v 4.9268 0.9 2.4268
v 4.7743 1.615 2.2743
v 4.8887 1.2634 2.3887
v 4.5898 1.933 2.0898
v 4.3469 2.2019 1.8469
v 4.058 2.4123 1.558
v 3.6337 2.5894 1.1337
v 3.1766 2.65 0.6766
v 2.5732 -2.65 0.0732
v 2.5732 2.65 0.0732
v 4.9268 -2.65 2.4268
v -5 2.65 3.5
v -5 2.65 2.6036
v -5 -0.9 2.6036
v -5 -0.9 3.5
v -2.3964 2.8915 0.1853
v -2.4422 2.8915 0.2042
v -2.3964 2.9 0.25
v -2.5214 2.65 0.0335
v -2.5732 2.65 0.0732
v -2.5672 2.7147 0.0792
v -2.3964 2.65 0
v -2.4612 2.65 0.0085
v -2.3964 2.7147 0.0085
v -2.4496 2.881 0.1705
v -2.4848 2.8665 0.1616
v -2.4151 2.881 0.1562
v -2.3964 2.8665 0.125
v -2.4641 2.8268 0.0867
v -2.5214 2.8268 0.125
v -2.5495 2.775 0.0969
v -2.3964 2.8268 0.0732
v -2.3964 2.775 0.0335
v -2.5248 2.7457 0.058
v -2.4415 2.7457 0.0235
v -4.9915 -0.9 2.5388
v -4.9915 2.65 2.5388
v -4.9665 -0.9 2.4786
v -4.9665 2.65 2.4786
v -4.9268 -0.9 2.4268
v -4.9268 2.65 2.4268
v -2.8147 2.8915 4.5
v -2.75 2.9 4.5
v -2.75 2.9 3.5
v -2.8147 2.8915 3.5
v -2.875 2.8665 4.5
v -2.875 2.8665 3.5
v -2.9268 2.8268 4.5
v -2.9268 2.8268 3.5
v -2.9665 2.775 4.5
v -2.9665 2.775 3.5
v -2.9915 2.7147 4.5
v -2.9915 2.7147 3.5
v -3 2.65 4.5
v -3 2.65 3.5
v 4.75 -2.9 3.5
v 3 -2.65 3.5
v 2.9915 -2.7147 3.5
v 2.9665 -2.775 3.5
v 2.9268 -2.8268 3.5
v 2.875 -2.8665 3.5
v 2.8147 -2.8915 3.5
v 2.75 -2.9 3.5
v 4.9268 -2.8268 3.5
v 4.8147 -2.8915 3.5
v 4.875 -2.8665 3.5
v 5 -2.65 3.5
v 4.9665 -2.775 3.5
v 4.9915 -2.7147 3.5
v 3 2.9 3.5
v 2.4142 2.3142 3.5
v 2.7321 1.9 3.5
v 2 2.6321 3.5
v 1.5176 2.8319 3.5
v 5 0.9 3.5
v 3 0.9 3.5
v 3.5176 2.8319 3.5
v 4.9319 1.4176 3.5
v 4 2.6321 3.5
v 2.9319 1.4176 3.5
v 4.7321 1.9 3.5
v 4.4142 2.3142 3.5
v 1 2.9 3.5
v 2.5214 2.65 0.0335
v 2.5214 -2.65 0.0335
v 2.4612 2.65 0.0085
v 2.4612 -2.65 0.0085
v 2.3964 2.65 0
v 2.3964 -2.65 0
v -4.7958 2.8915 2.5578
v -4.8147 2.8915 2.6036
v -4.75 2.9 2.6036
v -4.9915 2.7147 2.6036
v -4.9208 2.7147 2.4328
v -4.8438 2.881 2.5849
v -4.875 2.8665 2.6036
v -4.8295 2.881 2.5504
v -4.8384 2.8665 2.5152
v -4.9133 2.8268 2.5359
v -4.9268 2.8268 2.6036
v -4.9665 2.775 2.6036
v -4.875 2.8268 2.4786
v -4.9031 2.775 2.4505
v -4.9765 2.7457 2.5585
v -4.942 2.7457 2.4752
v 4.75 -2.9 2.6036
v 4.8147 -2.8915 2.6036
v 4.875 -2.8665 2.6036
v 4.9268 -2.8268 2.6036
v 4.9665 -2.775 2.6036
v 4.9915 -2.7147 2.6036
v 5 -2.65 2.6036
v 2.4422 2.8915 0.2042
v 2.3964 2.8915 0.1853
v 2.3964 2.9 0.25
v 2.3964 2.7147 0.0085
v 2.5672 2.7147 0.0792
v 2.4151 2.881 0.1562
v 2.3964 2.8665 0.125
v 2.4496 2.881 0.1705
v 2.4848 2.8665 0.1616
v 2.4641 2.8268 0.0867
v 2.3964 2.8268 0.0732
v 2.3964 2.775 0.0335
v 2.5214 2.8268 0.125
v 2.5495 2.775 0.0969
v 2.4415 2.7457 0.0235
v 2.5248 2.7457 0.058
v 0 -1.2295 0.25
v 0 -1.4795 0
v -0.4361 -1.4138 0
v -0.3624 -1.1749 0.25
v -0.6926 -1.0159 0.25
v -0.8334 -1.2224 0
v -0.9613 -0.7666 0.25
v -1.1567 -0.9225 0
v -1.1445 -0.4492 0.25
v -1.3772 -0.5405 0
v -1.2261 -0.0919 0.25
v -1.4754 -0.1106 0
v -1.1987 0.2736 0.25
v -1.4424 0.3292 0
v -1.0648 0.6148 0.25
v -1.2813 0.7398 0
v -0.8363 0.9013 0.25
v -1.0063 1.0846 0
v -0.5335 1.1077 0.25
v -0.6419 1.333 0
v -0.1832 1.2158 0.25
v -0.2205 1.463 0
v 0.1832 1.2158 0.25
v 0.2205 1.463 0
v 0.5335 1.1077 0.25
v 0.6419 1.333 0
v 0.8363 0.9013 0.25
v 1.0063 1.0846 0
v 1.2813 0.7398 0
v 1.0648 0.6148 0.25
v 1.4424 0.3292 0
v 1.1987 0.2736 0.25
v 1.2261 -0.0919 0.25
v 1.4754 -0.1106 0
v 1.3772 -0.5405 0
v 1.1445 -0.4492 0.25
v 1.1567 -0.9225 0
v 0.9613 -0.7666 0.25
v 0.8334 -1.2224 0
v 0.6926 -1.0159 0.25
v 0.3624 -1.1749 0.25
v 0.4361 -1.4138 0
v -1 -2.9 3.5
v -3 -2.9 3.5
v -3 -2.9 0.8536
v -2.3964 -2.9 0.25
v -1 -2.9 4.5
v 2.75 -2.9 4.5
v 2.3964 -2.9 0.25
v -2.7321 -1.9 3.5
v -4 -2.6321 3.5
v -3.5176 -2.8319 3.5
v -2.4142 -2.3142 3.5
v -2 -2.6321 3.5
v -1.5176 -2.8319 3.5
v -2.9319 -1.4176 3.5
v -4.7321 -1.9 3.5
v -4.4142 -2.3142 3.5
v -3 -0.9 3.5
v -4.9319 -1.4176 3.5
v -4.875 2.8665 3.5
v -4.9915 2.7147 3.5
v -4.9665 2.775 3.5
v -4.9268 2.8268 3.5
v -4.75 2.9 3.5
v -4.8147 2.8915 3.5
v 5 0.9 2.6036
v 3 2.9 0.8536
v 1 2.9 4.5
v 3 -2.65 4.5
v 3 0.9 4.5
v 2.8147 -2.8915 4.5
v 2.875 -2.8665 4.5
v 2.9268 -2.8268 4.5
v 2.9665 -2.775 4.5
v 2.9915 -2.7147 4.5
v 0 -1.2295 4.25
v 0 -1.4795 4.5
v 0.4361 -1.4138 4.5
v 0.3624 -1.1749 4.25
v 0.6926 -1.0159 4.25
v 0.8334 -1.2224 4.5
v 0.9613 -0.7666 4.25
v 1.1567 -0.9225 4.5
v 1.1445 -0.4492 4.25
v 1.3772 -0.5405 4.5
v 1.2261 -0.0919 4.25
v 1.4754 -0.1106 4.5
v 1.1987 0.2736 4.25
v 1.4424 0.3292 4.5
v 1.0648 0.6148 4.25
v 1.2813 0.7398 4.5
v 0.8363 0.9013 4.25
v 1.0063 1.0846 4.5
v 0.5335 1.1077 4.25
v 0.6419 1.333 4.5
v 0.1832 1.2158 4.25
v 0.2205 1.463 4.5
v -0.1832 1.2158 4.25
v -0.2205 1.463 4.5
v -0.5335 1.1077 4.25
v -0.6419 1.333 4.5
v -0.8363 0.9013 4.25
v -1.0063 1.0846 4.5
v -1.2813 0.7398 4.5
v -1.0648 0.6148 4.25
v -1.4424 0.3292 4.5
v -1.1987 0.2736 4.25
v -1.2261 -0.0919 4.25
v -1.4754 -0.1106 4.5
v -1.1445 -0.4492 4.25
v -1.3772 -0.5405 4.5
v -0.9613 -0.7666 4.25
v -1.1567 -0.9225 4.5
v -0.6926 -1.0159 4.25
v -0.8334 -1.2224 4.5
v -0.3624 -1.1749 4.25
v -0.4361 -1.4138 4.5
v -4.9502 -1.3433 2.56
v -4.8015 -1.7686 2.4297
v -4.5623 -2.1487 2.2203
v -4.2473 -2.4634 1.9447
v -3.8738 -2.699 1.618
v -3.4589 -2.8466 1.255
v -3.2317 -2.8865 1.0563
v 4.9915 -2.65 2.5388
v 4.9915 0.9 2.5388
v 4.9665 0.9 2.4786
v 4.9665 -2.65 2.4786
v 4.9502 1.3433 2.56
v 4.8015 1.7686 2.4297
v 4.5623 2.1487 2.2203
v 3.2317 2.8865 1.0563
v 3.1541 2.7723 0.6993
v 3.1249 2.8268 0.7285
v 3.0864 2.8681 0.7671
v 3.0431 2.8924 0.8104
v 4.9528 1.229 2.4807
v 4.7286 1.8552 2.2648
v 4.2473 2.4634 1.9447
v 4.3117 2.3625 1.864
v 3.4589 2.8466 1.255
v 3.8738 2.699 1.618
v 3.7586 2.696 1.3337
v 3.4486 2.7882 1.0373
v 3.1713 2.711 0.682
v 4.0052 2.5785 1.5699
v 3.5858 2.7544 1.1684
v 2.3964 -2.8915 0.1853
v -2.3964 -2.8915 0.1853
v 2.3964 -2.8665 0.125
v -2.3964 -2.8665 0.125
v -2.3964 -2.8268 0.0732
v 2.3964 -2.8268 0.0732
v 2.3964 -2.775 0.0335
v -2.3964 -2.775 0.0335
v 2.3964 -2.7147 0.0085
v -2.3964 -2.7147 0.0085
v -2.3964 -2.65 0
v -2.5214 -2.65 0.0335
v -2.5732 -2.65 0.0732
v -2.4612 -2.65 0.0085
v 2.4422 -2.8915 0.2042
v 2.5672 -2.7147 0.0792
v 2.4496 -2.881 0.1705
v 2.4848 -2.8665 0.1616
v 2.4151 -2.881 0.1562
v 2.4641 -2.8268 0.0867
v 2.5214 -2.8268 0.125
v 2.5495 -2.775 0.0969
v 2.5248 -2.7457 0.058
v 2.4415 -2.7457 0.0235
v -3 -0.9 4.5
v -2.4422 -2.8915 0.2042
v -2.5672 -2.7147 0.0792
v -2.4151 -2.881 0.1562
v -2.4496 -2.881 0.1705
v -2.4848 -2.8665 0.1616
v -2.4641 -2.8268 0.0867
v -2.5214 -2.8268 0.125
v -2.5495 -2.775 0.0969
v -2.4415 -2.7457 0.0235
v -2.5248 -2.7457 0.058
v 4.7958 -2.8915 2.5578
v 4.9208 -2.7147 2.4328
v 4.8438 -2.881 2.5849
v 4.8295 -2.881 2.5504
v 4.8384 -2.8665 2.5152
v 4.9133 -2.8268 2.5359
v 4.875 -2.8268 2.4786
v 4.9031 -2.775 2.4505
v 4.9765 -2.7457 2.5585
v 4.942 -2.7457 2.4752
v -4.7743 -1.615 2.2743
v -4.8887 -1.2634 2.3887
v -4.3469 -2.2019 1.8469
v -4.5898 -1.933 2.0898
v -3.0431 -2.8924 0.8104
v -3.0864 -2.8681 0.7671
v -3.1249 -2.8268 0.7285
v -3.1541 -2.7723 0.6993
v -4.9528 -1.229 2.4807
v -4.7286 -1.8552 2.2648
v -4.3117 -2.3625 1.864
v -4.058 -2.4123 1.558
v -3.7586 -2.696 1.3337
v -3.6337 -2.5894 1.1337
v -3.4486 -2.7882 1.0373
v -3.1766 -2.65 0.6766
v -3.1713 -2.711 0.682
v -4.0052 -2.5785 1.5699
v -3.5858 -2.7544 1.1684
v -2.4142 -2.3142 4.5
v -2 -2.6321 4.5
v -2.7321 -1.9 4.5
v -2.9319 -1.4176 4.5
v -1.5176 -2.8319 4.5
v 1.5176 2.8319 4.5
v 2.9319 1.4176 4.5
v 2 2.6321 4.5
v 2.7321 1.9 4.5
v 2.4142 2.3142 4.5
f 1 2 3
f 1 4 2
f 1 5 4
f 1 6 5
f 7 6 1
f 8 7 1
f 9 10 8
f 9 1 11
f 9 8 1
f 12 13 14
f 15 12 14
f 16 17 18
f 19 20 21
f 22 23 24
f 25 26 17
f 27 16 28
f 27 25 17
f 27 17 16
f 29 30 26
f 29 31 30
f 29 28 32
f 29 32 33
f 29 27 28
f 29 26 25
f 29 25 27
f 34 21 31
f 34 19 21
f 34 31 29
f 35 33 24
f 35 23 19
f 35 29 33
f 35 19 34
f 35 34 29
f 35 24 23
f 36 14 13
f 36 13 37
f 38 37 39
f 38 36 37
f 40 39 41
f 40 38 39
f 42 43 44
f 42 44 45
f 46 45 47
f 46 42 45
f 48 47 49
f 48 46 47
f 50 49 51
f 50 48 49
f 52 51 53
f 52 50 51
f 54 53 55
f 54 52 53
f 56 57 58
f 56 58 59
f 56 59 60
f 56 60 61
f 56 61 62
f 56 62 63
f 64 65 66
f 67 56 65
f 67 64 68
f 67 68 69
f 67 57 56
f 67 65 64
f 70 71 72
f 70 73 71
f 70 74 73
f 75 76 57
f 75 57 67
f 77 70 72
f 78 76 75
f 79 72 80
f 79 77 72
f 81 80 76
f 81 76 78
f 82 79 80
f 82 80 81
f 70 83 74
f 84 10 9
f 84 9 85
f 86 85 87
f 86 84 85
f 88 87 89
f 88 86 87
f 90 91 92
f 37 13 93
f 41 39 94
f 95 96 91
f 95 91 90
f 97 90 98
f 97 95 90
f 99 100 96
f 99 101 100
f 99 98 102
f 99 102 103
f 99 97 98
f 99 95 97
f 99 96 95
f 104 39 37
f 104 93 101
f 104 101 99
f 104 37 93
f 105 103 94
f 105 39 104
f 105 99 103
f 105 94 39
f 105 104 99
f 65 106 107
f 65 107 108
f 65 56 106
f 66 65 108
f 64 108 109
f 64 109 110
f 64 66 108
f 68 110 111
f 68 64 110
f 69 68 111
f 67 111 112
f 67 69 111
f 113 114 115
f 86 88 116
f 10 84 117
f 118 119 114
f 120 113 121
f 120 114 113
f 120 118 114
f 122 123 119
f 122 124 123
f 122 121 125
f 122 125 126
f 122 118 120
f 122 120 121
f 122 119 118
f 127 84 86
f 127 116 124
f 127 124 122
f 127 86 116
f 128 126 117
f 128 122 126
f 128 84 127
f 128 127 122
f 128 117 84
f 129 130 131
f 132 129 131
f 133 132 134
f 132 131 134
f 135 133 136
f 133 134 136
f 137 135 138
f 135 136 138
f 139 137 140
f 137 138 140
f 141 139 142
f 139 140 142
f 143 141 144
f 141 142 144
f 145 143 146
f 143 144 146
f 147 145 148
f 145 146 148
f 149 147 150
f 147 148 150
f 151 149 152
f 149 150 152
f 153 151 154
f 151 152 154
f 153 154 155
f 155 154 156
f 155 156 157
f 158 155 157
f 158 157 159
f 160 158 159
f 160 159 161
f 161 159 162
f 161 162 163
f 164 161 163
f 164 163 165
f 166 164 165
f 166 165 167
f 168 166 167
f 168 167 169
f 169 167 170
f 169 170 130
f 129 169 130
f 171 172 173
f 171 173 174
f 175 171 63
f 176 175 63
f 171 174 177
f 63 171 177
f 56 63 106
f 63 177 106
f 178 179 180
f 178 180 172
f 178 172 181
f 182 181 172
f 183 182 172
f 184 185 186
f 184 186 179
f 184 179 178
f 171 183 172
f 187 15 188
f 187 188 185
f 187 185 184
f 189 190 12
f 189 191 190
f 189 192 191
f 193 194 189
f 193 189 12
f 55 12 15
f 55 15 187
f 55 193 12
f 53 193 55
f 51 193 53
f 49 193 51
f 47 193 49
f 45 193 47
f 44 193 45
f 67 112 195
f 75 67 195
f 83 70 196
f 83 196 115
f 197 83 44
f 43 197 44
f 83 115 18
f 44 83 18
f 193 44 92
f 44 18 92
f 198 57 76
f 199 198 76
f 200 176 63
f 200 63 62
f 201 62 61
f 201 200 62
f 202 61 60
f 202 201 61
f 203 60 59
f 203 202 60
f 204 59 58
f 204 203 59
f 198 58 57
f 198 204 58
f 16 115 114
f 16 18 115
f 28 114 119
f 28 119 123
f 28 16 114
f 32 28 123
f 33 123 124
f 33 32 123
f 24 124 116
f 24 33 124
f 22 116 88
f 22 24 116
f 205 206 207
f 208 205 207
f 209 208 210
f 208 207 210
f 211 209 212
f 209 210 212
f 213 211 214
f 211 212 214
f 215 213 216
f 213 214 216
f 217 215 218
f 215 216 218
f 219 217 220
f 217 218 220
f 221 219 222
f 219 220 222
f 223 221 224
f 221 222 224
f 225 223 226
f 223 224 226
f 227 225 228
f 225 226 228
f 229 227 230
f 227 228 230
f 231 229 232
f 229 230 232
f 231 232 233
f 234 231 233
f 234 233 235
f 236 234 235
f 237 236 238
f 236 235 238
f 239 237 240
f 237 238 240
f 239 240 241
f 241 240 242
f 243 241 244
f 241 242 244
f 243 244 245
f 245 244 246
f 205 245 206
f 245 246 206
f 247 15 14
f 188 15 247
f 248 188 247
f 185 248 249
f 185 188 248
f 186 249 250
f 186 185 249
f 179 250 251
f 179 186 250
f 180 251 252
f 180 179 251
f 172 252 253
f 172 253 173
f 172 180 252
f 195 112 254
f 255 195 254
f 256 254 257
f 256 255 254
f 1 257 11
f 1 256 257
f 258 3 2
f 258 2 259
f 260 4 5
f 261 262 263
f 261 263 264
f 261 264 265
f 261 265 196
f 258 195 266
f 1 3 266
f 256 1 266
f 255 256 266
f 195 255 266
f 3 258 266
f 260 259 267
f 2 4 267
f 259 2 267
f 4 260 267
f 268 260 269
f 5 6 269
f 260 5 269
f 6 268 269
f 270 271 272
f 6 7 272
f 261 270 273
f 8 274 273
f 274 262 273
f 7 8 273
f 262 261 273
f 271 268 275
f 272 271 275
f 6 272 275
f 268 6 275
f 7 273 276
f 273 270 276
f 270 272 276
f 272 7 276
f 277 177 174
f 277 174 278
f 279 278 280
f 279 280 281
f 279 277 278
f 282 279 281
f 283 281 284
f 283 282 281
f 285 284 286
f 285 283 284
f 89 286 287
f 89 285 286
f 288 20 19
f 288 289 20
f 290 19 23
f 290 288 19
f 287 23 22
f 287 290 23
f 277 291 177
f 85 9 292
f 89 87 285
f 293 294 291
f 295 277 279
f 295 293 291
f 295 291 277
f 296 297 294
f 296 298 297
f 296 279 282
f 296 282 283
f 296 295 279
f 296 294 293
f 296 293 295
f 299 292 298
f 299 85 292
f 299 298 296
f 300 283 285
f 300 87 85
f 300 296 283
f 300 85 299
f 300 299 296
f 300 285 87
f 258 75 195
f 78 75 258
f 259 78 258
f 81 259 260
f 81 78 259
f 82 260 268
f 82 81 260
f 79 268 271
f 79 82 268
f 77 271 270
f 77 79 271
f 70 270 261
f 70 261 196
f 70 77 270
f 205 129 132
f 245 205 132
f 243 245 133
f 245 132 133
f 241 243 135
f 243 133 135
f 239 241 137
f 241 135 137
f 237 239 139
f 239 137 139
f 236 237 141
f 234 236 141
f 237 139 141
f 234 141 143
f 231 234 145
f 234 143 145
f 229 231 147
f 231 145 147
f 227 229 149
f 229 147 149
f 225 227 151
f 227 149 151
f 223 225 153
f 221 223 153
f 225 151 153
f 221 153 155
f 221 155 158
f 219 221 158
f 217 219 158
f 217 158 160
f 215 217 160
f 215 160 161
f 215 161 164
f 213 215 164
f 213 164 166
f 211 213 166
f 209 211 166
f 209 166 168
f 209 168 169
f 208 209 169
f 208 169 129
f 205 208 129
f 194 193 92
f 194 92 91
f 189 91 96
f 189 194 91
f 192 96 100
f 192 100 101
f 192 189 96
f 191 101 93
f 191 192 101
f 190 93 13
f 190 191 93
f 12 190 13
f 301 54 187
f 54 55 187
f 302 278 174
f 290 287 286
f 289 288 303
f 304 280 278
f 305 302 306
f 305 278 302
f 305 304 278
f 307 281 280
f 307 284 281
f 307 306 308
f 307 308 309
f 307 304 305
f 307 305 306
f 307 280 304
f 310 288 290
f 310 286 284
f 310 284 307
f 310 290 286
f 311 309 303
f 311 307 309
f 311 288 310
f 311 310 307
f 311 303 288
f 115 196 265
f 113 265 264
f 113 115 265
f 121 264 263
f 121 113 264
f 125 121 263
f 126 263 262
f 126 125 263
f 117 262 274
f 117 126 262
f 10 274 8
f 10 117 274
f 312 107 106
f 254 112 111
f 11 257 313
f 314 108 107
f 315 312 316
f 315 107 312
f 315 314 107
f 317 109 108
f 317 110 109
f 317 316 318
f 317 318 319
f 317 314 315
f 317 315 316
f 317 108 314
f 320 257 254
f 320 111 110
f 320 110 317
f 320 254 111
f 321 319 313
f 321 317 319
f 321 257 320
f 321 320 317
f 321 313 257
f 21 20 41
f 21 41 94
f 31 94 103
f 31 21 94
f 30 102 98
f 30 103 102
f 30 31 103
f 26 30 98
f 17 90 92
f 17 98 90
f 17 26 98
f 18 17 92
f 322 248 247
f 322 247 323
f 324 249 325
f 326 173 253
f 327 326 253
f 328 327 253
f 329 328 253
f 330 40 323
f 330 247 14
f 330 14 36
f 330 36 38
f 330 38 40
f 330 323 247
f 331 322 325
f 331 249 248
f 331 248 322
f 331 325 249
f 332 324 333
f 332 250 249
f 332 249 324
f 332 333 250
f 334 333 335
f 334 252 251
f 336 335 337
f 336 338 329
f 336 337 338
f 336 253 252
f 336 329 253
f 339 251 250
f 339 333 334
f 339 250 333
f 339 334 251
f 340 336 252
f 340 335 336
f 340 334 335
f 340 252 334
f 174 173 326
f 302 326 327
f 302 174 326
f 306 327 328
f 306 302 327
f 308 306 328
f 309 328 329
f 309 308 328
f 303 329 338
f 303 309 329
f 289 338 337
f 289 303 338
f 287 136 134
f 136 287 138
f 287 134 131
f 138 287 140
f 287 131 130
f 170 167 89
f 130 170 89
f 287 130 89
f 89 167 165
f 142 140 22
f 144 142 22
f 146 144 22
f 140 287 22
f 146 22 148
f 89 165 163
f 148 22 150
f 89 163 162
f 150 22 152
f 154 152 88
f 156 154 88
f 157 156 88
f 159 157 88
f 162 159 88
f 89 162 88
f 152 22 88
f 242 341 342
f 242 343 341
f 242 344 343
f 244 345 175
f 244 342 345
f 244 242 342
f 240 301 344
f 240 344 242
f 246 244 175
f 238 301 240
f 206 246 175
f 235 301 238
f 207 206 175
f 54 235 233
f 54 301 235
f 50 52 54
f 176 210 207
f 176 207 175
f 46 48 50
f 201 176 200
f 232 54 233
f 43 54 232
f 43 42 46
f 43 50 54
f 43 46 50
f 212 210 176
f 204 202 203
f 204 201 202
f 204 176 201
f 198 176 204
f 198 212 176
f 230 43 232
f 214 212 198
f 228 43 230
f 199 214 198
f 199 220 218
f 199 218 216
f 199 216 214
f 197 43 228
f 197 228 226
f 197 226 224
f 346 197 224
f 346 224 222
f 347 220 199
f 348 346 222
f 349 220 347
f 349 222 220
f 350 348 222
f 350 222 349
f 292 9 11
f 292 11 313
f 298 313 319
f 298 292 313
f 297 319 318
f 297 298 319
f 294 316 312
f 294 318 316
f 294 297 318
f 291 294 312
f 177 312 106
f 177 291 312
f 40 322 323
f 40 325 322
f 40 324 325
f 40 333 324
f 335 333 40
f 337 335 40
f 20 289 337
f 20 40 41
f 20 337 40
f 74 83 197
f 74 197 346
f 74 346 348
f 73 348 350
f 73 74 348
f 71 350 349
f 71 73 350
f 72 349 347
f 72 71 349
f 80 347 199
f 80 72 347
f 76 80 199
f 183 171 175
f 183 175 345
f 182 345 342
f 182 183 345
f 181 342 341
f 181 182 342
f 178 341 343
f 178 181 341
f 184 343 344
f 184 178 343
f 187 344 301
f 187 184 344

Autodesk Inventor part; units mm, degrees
ref_plane "YZ Plane" through (0, 0, 0) normal (1, 0, 0) x (0, 1, 0)
ref_plane "XZ Plane" through (0, 0, 0) normal (0, 1, 0) x (-1, 0, 0)
ref_plane "XY Plane" through (0, 0, 0) normal (0, 0, 1) x (1, 0, 0)
sketch "Esquisse1" plane through (0, 0, 0) normal (0, 0, 1) x (1, 0, 0)
  line L0 (-5, -2.9) -> (5, -2.9)
  line L1 (5, -2.9) -> (5, 2.9)
  line L2 (5, 2.9) -> (-5, 2.9)
  line L3 (-5, 2.9) -> (-5, -2.9)
  line L4 (-5, -2.9) -> (5, 2.9) construction
  line L5 (5, -2.9) -> (-5, 2.9) construction
  point P0 (0, 0)
  dimension "d0" = 10
  dimension "d1" = 5.8
extrude "Extrusion1" add sketch "Esquisse1" along normal blind 3.5
chamfer "Chanfrein1" distance 2.5 angle 45 2 edges at (5, 0, 0) (-5, 0, 0)
fillet "Congé1" radius 2 2 edges at (5, 2.9, 3) (-5, -2.9, 3)
fillet "Congé2" radius 0.25 12 edges at (0, 2.9, 0) (5, -1, 2.5) (4.4142, 2.3142, 1.9142) (3.75, -2.9, 1.25) (0, -2.9, 0) (2.5, 0, 0) (-2.5, 0, 0) (-3.75, 2.9, 1.25) (-5, 1, 2.5) (-4.4142, -2.3142, 1.9142) (-5, 2.9, 3) (5, -2.9, 3)
sketch "Esquisse2" plane through (0, 0, 3.5) normal (0, 0, 1) x (1, 0, 0)
  line L0 (3, 2.9) -> (-3, 2.9)
  line L1 (-3, 2.9) -> (-3, -2.9)
  line L2 (-3, -2.9) -> (3, -2.9)
  line L3 (3, -2.9) -> (3, 2.9)
  line L4 (3, 2.9) -> (-3, -2.9) construction
  line L5 (-3, 2.9) -> (3, -2.9) construction
  line L6 (-3, -2.9) -> (4.75, -2.9) projected
  point P0 (0, 0)
  dimension "d9" = 6
extrude "Extrusion2" add sketch "Esquisse2" along normal blind 1
fillet "Congé3" radius 2 2 edges at (3, 2.9, 4) (-3, -2.9, 4)
fillet "Congé4" radius 0.25 2 edges at (-3, 2.9, 4) (3, -2.9, 4)
sketch "Esquisse3" plane through (0, 0, 4.5) normal (0, 0, 1) x (1, 0, 0)
  point P0 (0, 0)
  point P1 (0, 0)
hole "Perçage1" at (0, 0, 4.5) direction (0, 0, -1) diameter 2.459 depth 8.8 tip angle 118 thread size "M3x0.5" class "6H" standard "ISO Metric profile"
chamfer "Chanfrein2" distance 0.25 angle 45 2 edges at (0, 1.2295, 4.5) (0, 1.2295, 0)
properties part number "Noix M3" material "Acier inoxydable"
